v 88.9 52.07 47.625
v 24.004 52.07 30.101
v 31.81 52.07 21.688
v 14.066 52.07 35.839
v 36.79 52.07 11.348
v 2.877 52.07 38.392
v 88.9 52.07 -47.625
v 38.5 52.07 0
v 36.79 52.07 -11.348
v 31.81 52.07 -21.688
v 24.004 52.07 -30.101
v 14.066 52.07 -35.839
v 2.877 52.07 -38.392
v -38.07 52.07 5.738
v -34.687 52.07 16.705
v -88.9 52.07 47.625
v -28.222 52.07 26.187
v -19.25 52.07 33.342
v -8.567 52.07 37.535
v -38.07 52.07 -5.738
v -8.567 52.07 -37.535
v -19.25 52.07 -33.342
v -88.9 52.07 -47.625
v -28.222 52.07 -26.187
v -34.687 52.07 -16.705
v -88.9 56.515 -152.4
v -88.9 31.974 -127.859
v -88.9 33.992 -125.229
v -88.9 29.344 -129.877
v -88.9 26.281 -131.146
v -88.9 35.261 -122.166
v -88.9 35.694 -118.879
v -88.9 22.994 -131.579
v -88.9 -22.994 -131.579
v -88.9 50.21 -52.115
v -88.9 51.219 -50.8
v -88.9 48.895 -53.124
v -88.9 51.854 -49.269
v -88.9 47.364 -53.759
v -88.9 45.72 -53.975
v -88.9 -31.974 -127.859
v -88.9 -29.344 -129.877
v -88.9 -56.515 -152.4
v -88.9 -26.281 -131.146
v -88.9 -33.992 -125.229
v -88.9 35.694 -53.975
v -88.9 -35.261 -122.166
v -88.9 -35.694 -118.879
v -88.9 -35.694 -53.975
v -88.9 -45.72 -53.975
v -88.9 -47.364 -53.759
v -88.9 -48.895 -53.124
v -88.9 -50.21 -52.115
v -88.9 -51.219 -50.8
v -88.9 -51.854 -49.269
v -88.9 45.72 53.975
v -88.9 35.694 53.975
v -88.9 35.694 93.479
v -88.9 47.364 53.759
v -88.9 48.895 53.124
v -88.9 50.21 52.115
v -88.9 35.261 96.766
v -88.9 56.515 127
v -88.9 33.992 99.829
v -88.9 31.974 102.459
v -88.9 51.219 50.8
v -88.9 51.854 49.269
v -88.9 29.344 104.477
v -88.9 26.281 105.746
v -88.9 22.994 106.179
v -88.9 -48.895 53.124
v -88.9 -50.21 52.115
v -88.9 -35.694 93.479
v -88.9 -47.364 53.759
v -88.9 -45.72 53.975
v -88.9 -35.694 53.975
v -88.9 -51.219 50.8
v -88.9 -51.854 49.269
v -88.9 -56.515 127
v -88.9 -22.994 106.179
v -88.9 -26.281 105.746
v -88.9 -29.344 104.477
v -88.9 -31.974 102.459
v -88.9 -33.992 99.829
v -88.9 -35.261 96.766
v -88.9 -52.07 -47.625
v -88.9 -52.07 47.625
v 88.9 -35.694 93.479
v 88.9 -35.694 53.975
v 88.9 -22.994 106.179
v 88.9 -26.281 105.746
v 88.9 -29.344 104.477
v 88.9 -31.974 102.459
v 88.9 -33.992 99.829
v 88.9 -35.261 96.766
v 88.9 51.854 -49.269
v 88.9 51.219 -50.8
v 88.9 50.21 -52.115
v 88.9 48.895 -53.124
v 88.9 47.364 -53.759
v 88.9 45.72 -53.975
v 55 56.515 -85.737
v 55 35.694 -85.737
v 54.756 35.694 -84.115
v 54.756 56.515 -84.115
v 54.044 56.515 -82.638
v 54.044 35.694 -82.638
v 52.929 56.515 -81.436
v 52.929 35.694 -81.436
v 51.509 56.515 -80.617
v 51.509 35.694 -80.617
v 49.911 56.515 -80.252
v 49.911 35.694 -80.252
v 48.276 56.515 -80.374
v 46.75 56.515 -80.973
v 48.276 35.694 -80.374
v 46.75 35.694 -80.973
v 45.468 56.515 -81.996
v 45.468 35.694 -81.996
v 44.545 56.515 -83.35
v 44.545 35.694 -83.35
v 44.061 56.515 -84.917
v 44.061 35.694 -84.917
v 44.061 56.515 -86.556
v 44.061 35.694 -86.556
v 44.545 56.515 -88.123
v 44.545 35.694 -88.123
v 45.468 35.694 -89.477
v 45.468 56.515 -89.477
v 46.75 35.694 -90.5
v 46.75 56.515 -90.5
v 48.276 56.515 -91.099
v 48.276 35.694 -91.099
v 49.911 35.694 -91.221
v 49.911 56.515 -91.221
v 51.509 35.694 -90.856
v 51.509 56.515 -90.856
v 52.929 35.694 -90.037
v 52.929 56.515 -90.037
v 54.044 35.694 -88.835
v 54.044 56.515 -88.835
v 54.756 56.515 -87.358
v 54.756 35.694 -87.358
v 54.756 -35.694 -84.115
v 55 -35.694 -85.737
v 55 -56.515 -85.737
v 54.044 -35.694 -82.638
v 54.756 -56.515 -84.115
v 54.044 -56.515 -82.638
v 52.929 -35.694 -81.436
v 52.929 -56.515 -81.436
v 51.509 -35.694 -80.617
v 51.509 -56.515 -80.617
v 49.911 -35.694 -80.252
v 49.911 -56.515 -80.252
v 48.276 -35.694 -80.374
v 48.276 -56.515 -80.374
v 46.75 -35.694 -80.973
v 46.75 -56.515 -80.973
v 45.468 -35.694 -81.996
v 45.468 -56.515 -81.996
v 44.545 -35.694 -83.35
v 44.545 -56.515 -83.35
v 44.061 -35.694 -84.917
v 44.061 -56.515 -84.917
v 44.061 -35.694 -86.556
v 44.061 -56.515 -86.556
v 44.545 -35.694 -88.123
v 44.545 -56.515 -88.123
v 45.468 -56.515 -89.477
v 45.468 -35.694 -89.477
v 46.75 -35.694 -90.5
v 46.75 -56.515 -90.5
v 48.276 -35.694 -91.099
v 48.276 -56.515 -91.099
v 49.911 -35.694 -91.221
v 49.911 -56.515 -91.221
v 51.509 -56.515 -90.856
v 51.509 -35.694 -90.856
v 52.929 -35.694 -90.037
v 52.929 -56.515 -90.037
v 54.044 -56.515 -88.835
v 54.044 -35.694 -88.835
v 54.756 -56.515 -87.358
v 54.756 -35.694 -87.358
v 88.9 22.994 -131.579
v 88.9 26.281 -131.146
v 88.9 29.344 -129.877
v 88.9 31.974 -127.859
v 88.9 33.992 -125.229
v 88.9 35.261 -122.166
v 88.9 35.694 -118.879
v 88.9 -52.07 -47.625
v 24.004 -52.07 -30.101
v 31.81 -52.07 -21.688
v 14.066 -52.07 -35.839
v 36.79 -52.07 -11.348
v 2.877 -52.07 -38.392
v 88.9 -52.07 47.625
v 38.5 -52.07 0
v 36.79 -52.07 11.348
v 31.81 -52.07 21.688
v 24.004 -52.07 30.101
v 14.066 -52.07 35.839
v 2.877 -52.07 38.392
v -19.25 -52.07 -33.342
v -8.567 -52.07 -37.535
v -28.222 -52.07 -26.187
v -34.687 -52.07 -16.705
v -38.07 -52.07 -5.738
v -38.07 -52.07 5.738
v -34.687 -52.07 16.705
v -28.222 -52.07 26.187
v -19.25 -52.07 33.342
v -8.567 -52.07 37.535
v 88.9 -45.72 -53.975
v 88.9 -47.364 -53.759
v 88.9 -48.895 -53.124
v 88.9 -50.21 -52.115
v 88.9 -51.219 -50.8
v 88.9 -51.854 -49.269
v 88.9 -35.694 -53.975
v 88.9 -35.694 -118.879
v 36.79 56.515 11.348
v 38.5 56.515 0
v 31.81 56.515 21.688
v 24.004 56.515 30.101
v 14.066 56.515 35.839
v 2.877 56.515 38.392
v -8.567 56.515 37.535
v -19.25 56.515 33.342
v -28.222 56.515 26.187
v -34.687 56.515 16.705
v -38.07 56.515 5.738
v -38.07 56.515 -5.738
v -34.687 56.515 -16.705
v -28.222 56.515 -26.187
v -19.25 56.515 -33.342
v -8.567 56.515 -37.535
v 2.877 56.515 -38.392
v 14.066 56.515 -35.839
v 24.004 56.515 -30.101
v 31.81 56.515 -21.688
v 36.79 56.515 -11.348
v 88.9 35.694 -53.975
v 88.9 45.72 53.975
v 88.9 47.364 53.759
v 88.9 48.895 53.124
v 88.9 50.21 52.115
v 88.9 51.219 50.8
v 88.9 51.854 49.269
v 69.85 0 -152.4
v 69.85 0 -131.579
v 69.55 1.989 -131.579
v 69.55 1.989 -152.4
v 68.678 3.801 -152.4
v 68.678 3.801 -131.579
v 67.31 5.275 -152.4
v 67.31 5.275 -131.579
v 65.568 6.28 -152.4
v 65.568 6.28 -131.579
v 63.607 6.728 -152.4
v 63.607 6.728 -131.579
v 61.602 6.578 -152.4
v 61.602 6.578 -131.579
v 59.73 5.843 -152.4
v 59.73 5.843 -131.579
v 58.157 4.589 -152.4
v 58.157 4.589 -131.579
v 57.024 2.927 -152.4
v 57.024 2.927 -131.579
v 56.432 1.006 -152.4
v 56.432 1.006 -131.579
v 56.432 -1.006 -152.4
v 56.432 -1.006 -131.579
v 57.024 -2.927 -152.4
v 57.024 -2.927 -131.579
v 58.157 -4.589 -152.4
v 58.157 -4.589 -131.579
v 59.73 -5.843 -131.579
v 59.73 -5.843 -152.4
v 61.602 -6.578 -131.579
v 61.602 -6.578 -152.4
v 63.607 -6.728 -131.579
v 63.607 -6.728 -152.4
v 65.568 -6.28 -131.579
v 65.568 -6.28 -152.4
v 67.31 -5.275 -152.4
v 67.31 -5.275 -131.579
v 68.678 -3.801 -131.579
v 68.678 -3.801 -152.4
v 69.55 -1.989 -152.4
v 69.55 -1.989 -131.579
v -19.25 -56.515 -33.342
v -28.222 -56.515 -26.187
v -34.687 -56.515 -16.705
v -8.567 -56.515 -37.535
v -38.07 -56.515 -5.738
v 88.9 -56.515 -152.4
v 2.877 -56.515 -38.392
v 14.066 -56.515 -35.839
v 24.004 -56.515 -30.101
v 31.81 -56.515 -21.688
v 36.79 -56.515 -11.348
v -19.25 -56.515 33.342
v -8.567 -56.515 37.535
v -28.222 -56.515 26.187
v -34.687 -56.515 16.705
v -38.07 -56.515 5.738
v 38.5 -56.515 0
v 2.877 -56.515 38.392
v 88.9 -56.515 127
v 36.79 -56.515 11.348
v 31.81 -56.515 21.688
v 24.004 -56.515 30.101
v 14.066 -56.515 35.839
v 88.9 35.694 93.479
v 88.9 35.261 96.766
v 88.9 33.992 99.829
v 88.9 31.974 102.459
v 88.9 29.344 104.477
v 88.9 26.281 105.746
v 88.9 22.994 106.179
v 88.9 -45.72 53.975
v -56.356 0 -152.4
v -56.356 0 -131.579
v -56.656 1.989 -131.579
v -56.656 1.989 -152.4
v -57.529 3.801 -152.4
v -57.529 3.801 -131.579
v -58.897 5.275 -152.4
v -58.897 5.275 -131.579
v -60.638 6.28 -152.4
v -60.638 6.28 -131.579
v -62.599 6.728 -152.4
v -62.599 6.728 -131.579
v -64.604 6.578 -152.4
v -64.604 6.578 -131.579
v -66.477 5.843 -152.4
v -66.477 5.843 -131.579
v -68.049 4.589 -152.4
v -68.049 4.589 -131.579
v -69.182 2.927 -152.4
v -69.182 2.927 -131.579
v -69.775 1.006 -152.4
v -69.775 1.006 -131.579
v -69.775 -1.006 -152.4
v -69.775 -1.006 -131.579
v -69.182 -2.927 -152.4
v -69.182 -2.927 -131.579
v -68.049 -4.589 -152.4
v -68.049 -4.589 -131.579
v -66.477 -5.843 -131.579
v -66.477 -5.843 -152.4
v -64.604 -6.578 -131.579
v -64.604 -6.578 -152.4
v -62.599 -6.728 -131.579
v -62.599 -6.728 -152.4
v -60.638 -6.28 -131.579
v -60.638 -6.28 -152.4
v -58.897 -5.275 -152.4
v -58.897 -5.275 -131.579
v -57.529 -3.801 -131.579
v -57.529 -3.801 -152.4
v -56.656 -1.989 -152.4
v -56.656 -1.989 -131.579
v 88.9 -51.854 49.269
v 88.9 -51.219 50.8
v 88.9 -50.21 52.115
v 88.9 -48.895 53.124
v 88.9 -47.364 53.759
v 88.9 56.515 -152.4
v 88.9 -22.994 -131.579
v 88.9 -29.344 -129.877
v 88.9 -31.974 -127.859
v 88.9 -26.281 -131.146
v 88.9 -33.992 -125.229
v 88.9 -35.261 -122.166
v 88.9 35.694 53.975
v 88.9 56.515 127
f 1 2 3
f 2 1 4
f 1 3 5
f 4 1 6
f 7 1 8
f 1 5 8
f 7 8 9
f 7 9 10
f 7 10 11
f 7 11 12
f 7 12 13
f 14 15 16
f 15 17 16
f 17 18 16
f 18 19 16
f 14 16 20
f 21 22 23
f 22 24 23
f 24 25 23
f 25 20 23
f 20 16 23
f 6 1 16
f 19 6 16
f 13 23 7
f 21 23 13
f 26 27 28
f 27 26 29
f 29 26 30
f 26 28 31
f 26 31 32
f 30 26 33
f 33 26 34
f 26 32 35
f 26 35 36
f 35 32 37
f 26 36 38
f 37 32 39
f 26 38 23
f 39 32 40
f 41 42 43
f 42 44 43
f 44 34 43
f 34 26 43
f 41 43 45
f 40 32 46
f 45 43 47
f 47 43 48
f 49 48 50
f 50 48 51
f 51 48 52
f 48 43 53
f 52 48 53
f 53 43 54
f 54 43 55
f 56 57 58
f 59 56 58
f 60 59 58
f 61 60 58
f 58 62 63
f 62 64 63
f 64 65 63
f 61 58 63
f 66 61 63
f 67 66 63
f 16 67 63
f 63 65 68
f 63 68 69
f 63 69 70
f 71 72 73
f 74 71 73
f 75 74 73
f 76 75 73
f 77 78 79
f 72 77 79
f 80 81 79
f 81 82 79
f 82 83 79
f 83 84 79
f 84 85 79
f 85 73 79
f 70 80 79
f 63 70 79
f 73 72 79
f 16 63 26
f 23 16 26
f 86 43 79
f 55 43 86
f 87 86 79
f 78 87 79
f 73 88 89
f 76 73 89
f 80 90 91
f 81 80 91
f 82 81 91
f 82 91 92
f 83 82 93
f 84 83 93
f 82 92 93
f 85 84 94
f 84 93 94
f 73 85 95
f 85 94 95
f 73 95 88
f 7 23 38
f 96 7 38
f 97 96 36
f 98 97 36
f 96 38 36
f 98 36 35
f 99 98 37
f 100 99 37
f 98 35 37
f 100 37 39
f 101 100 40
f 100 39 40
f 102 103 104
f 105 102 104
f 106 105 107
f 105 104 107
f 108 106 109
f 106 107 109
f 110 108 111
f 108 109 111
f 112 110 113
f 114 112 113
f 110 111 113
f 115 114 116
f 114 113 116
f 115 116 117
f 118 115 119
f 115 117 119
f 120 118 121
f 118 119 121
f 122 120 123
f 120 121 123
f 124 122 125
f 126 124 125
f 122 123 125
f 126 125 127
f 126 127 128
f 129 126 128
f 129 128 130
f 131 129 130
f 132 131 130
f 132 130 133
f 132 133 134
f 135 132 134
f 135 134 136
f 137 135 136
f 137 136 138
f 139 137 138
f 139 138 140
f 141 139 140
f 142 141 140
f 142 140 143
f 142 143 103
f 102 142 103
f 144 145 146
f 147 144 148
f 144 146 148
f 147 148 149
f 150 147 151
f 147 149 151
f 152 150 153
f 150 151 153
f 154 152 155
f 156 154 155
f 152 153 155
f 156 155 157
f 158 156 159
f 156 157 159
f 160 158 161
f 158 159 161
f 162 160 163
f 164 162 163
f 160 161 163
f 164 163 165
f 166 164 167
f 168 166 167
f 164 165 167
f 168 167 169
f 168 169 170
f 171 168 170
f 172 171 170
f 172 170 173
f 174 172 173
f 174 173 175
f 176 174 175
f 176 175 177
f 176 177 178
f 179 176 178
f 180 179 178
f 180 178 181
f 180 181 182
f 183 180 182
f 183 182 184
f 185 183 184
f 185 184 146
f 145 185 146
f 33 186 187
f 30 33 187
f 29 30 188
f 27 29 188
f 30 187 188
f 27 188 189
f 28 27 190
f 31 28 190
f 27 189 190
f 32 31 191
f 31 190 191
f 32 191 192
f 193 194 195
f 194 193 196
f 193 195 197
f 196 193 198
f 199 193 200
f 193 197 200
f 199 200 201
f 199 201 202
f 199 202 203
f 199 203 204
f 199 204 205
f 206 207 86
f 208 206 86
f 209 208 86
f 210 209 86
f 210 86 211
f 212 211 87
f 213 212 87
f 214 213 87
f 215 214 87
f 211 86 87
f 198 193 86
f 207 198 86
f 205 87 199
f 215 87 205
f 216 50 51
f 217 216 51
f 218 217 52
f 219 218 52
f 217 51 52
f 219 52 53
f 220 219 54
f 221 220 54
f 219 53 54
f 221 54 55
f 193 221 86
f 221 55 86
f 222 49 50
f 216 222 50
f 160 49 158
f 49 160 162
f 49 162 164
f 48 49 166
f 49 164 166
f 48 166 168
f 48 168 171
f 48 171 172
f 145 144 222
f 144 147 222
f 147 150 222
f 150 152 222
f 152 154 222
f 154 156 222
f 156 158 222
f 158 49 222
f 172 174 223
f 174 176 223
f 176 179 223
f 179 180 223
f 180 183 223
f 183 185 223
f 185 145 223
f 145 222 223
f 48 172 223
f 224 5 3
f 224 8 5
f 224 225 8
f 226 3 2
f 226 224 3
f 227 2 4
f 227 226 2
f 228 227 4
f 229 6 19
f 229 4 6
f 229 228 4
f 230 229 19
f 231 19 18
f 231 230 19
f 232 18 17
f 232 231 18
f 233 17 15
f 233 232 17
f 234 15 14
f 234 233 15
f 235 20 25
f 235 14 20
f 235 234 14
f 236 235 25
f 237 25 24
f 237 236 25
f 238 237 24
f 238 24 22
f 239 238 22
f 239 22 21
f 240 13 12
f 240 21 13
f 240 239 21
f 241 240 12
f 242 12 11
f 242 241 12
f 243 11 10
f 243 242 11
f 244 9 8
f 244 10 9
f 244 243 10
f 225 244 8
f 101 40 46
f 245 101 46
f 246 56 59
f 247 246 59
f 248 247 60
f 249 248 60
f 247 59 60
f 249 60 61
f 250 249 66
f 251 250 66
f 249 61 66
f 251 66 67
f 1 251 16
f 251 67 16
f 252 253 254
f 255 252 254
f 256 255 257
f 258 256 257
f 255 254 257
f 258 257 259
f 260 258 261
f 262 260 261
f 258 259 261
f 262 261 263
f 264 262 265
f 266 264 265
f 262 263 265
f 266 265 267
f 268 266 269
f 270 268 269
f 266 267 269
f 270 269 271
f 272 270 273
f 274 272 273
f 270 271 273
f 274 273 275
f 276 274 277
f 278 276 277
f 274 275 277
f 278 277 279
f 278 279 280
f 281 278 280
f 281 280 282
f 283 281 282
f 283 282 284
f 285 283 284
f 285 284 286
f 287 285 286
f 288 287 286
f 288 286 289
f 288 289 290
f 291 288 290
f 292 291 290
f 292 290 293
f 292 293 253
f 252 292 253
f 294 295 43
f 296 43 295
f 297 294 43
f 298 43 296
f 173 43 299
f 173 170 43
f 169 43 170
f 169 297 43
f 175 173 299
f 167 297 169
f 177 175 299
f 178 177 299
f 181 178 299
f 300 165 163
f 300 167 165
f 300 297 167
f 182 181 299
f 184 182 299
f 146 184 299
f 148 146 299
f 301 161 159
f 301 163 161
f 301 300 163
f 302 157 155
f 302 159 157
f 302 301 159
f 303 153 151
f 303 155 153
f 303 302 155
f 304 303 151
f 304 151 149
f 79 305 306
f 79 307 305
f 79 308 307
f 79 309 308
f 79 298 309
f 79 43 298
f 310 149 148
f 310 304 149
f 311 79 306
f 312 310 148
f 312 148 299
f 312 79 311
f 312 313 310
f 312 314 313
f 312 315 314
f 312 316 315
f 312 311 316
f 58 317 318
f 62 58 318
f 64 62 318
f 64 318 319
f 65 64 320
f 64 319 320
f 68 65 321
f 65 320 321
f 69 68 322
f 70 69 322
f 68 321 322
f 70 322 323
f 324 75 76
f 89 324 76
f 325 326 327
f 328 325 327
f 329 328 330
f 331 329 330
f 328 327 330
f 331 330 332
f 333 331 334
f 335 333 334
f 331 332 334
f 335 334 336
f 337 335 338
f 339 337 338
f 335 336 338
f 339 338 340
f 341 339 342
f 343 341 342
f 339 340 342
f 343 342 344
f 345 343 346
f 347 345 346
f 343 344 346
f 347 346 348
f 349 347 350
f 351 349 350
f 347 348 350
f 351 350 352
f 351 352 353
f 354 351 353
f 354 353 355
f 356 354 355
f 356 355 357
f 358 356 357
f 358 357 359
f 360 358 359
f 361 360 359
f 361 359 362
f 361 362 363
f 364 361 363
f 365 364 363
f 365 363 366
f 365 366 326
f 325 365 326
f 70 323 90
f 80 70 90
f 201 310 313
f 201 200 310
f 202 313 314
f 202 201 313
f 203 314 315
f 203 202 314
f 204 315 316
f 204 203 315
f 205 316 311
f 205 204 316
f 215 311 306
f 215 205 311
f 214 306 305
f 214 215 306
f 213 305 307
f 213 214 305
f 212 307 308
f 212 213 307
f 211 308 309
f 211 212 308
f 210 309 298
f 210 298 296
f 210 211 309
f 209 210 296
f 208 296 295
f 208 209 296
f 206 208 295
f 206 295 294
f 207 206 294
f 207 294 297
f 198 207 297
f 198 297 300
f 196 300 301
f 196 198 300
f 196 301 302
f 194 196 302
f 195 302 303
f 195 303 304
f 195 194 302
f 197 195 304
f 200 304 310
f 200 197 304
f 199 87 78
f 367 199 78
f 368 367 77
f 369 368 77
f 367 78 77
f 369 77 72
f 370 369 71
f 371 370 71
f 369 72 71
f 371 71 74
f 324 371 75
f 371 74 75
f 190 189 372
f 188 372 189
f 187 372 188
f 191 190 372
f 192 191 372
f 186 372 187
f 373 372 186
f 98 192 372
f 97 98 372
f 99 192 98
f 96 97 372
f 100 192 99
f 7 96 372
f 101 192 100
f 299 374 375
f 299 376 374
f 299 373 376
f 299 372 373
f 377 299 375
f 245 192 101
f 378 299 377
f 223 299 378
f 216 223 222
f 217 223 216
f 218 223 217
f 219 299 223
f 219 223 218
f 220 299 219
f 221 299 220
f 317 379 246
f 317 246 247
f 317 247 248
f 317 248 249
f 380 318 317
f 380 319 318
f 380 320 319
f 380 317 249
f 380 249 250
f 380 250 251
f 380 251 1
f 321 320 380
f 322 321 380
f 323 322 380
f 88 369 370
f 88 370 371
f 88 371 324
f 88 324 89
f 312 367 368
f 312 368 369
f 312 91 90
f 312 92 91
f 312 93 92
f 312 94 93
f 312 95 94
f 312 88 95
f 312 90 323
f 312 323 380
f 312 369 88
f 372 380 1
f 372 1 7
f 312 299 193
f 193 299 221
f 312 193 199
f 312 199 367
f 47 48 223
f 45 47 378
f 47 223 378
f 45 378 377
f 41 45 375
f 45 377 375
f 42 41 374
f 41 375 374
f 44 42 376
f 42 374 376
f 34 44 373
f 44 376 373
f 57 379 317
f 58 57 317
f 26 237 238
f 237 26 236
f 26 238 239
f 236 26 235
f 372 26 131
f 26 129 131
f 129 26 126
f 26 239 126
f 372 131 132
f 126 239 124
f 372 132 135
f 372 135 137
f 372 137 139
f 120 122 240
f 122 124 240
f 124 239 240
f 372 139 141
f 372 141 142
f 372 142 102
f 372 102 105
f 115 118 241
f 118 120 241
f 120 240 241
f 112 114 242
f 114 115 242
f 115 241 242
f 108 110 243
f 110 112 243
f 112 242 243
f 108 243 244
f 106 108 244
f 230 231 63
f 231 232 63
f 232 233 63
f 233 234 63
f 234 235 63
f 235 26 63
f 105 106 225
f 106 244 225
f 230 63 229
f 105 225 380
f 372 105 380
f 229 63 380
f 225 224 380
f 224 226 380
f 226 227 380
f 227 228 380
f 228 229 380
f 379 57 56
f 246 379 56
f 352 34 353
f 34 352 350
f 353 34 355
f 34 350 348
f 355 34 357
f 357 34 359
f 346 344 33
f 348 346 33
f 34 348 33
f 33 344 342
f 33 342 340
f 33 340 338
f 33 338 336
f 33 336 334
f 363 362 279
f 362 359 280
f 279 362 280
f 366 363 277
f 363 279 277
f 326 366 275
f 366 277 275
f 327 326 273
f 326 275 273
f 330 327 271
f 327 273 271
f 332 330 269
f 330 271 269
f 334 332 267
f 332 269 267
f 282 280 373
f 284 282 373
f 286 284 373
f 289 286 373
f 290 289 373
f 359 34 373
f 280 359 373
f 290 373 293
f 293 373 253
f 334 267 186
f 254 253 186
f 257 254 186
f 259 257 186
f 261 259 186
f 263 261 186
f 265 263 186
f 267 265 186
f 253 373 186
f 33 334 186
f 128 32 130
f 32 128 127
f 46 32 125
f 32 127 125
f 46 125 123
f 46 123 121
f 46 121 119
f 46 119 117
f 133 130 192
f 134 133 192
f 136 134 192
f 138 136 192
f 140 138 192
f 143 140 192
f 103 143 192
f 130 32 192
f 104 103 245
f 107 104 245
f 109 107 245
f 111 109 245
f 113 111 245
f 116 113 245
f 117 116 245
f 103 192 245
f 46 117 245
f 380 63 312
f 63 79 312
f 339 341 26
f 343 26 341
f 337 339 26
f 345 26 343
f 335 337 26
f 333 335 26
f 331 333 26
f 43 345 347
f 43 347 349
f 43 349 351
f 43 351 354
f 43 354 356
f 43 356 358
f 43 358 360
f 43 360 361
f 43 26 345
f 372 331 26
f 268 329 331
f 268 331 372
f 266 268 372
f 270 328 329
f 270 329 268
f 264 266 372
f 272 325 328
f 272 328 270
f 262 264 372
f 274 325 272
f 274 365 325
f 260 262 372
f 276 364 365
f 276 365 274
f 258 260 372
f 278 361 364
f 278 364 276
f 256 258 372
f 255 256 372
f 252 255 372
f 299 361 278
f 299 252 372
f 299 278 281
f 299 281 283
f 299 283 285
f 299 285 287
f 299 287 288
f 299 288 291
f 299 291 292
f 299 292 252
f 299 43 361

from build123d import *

# Parameters (mm, degrees)
F0_W     = 177.8
F0_H     = 279.4
F0_R     = 38.5
F1_DEPTH = 56.515
F3_DEPTH = 177.801
F5_DEPTH = 177.801
F6_R     = 6.746875
F7_DEPTH = 20.8223992262
F8_R     = 5.5
F9_DEPTH = 113.031


with BuildPart() as f1:
    # F0 (on Front) → F1 (new body, symmetric)
    with BuildSketch(Plane.XZ):
        with Locations((0, -12.7)):
            Rectangle(F0_W, F0_H)
        Circle(F0_R, mode=Mode.SUBTRACT)
    extrude(amount=F1_DEPTH, both=True)

    # F2 (on face) → F3 (cut, through all)
    with BuildSketch(Plane.YZ.offset(88.9)):
        with BuildLine():
            ThreePointArc((22.9936007738, -131.5786007738), (31.9738568949, -127.8588568949), (35.6936007738, -118.8786007738))
            Line((35.6936007738, -118.8786007738), (35.6936007738, 93.4786007738))
            ThreePointArc((35.6936007738, 93.4786007738), (31.9738568949, 102.4588568949), (22.9936007738, 106.1786007738))
            Line((22.9936007738, 106.1786007738), (-22.9936007738, 106.1786007738))
            ThreePointArc((-22.9936007738, 106.1786007738), (-31.9738568949, 102.4588568949), (-35.6936007738, 93.4786007738))
            Line((-35.6936007738, 93.4786007738), (-35.6936007738, -118.8786007738))
            ThreePointArc((-35.6936007738, -118.8786007738), (-31.9738568949, -127.8588568949), (-22.9936007738, -131.5786007738))
            Line((-22.9936007738, -131.5786007738), (22.9936007738, -131.5786007738))
        make_face()
    extrude(amount=-F3_DEPTH, mode=Mode.SUBTRACT)

    # F4 (on face) → F5 (cut, through all)
    with BuildSketch(Plane(origin=(-88.9, 0, 0), x_dir=(0, -1, 0), z_dir=(-1, 0, 0))):
        with BuildLine():
            Line((45.72, 53.975), (-45.72, 53.975))
            ThreePointArc((-45.72, 53.975), (-50.2101280605, 52.1151280605), (-52.07, 47.625))
            Line((-52.07, 47.625), (-52.07, -47.625))
            ThreePointArc((-52.07, -47.625), (-50.2101280605, -52.1151280605), (-45.72, -53.975))
            Line((-45.72, -53.975), (45.72, -53.975))
            ThreePointArc((45.72, -53.975), (50.2101280605, -52.1151280605), (52.07, -47.625))
            Line((52.07, -47.625), (52.07, 47.625))
            ThreePointArc((52.07, 47.625), (50.2101280605, 52.1151280605), (45.72, 53.975))
        make_face()
    extrude(amount=-F5_DEPTH, mode=Mode.SUBTRACT)

    # F6 (on face) → F7 (cut, through all)
    with BuildSketch(Plane.XY.offset(-131.5786007738)):
        with Locations((63.103125, 0)):
            Circle(F6_R)
        with Locations((-63.103125, 0)):
            Circle(F6_R)
    extrude(amount=-F7_DEPTH, mode=Mode.SUBTRACT)

    # F8 (on face) → F9 (cut, through all)
    with BuildSketch(Plane.XZ.offset(56.515)):
        with Locations((49.5, -85.7365149747)):
            Circle(F8_R)
    extrude(amount=-F9_DEPTH, mode=Mode.SUBTRACT)


solid = f1.part
